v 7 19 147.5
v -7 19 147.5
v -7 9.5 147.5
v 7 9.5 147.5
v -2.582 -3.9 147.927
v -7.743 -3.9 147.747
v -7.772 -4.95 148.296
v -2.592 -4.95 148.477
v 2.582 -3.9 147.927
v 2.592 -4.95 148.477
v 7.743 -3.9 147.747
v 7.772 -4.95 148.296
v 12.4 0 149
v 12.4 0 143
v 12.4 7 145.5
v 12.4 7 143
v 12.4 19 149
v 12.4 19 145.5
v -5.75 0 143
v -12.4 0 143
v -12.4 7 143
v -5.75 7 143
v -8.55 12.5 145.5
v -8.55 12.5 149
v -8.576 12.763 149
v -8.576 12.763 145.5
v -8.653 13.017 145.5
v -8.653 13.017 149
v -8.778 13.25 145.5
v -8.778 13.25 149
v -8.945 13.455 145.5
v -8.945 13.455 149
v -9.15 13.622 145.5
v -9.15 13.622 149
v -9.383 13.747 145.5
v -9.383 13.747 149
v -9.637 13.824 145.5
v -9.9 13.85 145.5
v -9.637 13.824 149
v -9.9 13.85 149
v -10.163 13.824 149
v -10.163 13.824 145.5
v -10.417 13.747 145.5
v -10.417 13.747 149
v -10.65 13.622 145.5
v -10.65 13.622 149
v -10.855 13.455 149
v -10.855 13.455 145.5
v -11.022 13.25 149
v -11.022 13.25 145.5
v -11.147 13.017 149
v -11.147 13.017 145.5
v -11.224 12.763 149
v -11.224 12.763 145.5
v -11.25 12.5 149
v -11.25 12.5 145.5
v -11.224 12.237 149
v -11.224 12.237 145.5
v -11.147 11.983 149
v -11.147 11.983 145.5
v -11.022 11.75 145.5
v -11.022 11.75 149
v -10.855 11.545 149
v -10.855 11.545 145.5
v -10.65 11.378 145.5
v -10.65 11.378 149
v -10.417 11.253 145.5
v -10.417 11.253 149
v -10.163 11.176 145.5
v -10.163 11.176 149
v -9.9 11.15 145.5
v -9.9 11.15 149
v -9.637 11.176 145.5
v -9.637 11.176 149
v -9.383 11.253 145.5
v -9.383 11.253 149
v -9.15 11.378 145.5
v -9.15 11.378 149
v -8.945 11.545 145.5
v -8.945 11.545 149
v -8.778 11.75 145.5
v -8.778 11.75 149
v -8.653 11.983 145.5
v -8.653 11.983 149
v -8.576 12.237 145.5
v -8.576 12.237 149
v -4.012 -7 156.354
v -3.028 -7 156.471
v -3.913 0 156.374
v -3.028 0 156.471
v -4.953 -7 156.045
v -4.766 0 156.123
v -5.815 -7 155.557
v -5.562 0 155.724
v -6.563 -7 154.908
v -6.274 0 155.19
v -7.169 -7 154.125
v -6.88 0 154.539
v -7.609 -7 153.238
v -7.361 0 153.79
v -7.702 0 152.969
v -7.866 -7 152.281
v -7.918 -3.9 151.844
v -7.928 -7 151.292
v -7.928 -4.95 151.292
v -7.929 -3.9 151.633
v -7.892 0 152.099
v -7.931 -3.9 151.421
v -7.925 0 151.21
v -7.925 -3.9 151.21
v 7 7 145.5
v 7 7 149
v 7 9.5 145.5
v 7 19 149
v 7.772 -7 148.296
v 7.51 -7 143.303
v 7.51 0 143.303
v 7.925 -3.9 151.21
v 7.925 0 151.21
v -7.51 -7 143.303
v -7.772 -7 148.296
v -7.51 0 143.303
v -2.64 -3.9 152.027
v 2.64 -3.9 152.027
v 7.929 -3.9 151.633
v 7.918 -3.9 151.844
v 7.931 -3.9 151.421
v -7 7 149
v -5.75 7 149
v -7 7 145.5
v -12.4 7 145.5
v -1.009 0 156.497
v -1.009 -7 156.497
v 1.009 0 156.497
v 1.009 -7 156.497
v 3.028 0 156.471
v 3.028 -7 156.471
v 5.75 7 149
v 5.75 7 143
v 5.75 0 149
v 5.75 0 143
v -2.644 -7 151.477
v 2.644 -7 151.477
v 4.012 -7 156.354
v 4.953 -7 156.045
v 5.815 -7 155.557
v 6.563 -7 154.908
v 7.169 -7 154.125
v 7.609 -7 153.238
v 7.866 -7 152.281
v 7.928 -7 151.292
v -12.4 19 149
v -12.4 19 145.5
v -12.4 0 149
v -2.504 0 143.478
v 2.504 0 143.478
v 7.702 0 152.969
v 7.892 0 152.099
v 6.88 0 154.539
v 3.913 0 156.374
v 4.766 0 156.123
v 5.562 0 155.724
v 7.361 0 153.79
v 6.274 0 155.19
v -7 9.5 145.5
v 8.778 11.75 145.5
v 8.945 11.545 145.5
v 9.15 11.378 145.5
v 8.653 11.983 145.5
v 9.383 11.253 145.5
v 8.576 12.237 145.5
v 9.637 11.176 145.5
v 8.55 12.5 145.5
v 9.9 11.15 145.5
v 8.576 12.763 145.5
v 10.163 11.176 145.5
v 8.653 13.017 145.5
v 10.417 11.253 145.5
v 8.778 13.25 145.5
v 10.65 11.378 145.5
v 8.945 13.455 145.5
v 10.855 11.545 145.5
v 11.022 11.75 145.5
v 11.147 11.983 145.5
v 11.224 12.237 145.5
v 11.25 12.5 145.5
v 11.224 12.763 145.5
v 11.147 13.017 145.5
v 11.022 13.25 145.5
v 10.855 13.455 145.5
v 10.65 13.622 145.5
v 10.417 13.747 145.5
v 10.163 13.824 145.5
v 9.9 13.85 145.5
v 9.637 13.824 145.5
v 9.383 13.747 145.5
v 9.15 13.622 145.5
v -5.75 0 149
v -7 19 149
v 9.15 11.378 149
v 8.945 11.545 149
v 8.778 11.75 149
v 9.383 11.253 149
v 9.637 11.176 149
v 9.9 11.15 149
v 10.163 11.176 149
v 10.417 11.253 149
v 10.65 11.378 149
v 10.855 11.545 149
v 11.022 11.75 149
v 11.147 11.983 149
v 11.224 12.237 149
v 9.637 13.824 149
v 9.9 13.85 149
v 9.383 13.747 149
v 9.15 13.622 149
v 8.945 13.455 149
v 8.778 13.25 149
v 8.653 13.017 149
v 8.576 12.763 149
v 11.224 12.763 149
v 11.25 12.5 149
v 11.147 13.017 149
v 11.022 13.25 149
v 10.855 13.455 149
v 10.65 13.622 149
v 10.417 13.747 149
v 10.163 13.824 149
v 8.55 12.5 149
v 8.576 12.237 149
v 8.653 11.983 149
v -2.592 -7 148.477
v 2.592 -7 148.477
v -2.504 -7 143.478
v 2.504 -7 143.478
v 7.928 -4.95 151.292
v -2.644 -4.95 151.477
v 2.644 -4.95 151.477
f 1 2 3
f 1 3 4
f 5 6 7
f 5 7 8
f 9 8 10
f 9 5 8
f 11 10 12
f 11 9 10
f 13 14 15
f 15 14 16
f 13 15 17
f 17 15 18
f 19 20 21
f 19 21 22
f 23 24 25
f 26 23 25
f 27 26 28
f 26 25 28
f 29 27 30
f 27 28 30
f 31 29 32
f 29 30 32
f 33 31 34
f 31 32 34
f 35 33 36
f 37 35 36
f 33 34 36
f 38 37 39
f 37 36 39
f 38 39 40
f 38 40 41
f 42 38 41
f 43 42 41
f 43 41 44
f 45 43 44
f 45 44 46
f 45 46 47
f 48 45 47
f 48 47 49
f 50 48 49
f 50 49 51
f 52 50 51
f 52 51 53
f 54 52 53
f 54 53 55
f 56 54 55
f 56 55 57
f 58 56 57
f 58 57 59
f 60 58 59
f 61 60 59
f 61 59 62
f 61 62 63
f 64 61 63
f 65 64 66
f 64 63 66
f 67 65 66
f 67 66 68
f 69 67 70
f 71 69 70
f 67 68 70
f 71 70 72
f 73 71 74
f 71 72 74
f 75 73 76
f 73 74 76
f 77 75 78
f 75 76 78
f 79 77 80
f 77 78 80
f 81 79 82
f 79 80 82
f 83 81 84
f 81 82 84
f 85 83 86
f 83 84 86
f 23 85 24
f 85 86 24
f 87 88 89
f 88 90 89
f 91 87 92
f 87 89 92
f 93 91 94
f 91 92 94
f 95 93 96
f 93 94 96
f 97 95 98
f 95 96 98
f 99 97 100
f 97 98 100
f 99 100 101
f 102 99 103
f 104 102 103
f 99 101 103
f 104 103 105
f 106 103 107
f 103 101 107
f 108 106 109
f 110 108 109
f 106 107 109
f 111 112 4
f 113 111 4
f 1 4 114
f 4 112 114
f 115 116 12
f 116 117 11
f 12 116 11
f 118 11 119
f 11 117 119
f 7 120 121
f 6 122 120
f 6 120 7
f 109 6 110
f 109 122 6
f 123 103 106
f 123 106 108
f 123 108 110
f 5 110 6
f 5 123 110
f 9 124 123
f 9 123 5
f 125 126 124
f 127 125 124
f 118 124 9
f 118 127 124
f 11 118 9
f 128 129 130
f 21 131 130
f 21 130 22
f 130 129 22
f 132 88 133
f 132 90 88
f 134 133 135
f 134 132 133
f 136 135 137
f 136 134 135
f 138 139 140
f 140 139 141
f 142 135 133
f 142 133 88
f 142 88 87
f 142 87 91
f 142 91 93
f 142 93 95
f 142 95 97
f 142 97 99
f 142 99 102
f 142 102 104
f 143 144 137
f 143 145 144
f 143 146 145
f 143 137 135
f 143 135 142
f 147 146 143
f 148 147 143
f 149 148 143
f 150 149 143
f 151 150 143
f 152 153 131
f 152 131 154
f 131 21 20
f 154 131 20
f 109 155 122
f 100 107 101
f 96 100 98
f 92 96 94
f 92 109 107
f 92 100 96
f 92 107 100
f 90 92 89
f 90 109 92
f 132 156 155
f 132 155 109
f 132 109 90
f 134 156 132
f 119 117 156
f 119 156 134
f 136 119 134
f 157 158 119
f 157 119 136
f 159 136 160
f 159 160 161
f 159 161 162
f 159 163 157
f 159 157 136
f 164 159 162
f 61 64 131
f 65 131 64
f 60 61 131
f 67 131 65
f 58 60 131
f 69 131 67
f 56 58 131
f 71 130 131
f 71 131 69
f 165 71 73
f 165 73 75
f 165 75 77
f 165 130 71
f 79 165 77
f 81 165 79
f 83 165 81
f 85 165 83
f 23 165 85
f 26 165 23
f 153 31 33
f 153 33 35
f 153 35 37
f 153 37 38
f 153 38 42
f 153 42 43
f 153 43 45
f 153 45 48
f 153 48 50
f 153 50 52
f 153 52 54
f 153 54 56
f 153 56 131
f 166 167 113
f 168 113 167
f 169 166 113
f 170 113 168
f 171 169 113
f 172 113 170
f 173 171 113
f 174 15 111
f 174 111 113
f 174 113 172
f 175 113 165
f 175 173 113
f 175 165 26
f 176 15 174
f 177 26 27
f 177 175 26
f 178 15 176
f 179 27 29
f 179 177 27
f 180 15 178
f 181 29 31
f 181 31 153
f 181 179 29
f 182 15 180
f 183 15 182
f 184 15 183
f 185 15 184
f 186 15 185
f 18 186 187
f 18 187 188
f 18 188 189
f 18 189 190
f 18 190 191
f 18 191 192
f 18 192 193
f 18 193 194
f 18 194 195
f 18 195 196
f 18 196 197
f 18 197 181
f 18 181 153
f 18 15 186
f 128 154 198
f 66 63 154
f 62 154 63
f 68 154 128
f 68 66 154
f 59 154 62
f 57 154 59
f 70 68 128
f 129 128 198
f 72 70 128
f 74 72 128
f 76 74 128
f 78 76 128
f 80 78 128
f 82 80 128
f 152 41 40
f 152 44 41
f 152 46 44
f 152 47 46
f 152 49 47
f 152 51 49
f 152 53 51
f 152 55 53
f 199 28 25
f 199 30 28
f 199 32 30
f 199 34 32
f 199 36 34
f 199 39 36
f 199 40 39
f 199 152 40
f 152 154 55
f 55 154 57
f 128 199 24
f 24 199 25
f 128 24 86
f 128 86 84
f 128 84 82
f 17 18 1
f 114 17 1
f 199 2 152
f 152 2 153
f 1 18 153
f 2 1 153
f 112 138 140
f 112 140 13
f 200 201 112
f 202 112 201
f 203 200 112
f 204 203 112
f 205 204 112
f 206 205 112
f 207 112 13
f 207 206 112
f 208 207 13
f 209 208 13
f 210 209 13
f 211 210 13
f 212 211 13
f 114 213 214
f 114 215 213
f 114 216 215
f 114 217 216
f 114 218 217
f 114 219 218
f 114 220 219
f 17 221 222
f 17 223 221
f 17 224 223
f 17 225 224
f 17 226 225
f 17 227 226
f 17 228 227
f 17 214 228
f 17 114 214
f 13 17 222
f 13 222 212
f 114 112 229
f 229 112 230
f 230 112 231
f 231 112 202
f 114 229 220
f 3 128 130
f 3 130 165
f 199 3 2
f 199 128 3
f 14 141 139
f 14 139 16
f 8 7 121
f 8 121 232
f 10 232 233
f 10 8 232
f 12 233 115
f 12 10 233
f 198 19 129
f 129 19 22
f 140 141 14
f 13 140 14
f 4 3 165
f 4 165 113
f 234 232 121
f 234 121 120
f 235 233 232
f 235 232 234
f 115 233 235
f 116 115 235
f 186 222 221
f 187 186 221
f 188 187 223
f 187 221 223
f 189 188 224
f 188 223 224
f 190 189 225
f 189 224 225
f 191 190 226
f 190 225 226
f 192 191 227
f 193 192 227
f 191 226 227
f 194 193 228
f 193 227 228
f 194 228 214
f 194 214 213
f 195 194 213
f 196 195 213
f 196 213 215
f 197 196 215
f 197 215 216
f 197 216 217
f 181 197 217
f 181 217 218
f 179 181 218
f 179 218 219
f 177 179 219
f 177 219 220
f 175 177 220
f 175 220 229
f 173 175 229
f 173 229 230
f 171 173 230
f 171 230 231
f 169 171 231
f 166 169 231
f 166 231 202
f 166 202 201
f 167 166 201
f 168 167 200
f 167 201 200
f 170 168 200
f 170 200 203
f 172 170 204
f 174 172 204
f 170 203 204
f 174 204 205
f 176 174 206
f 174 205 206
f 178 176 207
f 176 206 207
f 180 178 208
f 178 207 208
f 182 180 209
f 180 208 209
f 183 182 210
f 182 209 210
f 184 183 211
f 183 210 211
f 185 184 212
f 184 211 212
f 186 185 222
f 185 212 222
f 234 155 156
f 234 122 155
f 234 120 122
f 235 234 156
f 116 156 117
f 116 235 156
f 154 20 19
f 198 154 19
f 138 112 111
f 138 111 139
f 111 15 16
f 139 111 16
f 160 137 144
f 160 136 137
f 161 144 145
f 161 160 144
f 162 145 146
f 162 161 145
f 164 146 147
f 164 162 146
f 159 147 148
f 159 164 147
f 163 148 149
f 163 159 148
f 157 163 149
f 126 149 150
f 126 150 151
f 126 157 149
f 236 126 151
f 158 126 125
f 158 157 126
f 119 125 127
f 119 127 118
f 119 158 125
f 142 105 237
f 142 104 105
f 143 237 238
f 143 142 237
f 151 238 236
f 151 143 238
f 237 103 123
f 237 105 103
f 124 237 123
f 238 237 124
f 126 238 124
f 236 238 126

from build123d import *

# Parameters (mm, degrees)
MAIN_DEPTH            = 6
SKETCH8_R             = 1.35
HOLES_DEPTH           = 7
SKETCH12_W            = 14
SKETCH12_H            = 12
COMPONENTHOLES2_DEPTH = 1.5
SKETCH17_W            = 14
SKETCH17_H            = 2.5
HOLESCABLES_DEPTH     = 5.5
SKETCH16_W            = 2.5
SKETCH16_H            = 12
FIXEXTRUSION_DEPTH    = 25.8
SUPPORT_ANGLE         = 6
FILLET1_R             = 5


with BuildPart() as part:
    # Sketch7 → Main (new body)
    with BuildSketch(Plane.XY.offset(143)):
        Polygon((-12.4, 0), (-5.75, 0), (-5.75, 7), (5.75, 7), (5.75, 0), (12.4, 0), (12.4, 19), (-12.4, 19), align=None)
    extrude(amount=MAIN_DEPTH)

    # Sketch8 → Holes (cut, through all)
    with BuildSketch(Plane.XY.offset(149)):
        with Locations((-9.9, 12.5)):
            Circle(SKETCH8_R)
        with Locations((9.9, 12.5)):
            Circle(SKETCH8_R)
    extrude(amount=-HOLES_DEPTH, mode=Mode.SUBTRACT)

    # Sketch12 → ComponentHoles2 (cut)
    with BuildSketch(Plane.XY.offset(149)):
        with Locations((0, 13)):
            Rectangle(SKETCH12_W, SKETCH12_H)
    extrude(amount=-COMPONENTHOLES2_DEPTH, mode=Mode.SUBTRACT)

    # Sketch17 → HolesCables (cut, through all)
    with BuildSketch(Plane.XY.offset(147.5)):
        with Locations((0, 8.25)):
            Rectangle(SKETCH17_W, SKETCH17_H)
    extrude(amount=-HOLESCABLES_DEPTH, mode=Mode.SUBTRACT)

    # Sketch16 → FixExtrusion (cut, through all)
    with BuildSketch(Plane(origin=(12.4, 0, 0), x_dir=(0, 0, -1), z_dir=(1, 0, 0))):
        with Locations((-144.25, 13)):
            Rectangle(SKETCH16_W, SKETCH16_H)
    extrude(amount=-FIXEXTRUSION_DEPTH, mode=Mode.SUBTRACT)


with BuildPart() as body_2:
    # Sketch10 → Support (revolve, symmetric)
    with BuildSketch(Plane(origin=(0, 0, 0), x_dir=(0, 0, -1), z_dir=(1, 0, 0))) as support_sk:
        Polygon((-147.95, -3.9), (-152.05, -3.9), (-151.5, -4.95), (-151.5, -7), (-156.5, -7), (-156.5, 0), (-143.5, 0), (-143.5, -7), (-148.5, -7), (-148.5, -4.95), align=None)
    revolve(axis=Axis((0, 11, 0), (0, -1, 0)), revolution_arc=SUPPORT_ANGLE / 2)
    revolve(support_sk.sketch, axis=Axis((0, 11, 0), (0, 1, 0)), revolution_arc=SUPPORT_ANGLE / 2)

    # Fillet1
    fillet1_edges = [body_2.edges().sort_by_distance(p)[0] for p in [
        (8.190577152, -3.5, 156.285522189),
        (-8.190577152, -3.5, 156.285522189),
    ]]
    fillet(fillet1_edges, radius=FILLET1_R)


solid = Compound([part.part, body_2.part])
